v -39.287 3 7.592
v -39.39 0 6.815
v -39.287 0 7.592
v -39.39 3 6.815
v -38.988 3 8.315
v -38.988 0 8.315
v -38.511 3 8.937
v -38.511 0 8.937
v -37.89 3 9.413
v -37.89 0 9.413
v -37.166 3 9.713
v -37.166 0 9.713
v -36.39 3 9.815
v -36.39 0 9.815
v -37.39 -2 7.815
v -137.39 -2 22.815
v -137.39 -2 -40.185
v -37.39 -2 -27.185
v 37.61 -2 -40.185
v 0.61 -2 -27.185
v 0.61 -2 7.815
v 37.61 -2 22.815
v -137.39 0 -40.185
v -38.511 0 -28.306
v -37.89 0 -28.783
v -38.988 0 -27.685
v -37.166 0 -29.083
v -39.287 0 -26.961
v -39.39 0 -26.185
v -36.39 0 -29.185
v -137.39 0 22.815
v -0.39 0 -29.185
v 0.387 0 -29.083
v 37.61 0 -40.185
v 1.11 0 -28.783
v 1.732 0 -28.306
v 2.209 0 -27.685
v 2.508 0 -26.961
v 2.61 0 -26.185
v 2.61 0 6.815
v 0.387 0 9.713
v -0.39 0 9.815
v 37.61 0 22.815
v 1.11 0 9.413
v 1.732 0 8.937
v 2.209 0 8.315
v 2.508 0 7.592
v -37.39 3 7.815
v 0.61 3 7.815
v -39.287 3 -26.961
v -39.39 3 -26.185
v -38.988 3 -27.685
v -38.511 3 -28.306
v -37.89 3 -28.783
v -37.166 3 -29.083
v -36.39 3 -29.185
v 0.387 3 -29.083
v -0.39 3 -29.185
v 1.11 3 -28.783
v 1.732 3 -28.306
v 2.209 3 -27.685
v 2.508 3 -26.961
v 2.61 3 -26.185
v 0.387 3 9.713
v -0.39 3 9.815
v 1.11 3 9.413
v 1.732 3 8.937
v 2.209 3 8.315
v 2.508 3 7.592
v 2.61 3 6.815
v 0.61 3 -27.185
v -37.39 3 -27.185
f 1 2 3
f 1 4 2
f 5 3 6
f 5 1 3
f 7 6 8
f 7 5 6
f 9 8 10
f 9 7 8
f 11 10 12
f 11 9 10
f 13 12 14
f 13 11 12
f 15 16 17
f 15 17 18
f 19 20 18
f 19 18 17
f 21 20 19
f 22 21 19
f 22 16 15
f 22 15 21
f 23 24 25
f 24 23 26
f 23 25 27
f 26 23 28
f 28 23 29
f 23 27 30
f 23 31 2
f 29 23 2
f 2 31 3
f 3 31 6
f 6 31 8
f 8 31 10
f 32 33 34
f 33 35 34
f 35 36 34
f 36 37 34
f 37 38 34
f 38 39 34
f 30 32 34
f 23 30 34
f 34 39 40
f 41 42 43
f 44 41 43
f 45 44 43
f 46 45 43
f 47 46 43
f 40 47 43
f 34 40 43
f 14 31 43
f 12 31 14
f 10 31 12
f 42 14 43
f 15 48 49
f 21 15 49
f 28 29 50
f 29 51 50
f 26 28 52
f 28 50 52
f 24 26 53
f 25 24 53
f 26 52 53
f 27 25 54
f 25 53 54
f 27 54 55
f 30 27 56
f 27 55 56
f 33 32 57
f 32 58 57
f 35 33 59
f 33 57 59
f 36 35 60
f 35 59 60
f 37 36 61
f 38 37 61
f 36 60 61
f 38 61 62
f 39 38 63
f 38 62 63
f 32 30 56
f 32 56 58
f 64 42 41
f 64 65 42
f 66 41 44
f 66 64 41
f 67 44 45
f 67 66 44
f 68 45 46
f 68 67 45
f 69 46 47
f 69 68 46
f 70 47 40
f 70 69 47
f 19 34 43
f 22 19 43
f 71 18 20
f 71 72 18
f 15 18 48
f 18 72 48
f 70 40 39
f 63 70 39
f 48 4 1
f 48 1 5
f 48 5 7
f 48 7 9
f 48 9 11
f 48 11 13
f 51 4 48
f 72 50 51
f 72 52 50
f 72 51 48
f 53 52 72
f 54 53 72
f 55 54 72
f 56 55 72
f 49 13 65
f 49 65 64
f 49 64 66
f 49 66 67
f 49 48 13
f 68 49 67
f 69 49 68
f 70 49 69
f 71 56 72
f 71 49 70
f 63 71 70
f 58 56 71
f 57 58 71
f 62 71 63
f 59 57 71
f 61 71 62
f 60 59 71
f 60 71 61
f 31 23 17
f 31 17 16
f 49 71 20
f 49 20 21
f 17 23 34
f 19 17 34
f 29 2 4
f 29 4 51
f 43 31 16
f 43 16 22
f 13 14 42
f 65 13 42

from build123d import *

# Parameters (mm, degrees)
SKETCH1_W           = 42
SKETCH1_H           = 39
SKETCH1_W_2         = 38
SKETCH1_H_2         = 35
BOSS_EXTRUDE1_DEPTH = 3
FILLET2_R           = 3
SKETCH5_W           = 175
SKETCH5_H           = 63
SKETCH5_W_2         = 38
SKETCH5_H_2         = 35
BOSS_EXTRUDE2_DEPTH = 2


with BuildPart() as part:
    # Sketch1 → Boss-Extrude1 (new body)
    with BuildSketch(Plane(origin=(0, 0, 0), x_dir=(1, 0, 0), z_dir=(0, 1, 0))):
        with Locations((-18.389520702, 9.684818057)):
            Rectangle(SKETCH1_W, SKETCH1_H)
        with Locations((-18.389520702, 9.684818057)):
            Rectangle(SKETCH1_W_2, SKETCH1_H_2, mode=Mode.SUBTRACT)
    extrude(amount=BOSS_EXTRUDE1_DEPTH)

    # Fillet2
    fillet2_edges = [part.edges().sort_by_distance(p)[0] for p in [
        (-39.389520702, 1.5, -29.184818057),
        (2.610479298, 1.5, -29.184818057),
        (2.610479298, 1.5, 9.815181943),
        (-39.389520702, 1.5, 9.815181943),
    ]]
    fillet(fillet2_edges, radius=FILLET2_R)

    # Sketch5 → Boss-Extrude2 (add)
    with BuildSketch(Plane.XZ):
        with Locations((-49.889520702, -8.684818057)):
            Rectangle(SKETCH5_W, SKETCH5_H)
        with Locations((-18.389520702, -9.684818057)):
            Rectangle(SKETCH5_W_2, SKETCH5_H_2, mode=Mode.SUBTRACT)
    extrude(amount=BOSS_EXTRUDE2_DEPTH)


solid = part.part
